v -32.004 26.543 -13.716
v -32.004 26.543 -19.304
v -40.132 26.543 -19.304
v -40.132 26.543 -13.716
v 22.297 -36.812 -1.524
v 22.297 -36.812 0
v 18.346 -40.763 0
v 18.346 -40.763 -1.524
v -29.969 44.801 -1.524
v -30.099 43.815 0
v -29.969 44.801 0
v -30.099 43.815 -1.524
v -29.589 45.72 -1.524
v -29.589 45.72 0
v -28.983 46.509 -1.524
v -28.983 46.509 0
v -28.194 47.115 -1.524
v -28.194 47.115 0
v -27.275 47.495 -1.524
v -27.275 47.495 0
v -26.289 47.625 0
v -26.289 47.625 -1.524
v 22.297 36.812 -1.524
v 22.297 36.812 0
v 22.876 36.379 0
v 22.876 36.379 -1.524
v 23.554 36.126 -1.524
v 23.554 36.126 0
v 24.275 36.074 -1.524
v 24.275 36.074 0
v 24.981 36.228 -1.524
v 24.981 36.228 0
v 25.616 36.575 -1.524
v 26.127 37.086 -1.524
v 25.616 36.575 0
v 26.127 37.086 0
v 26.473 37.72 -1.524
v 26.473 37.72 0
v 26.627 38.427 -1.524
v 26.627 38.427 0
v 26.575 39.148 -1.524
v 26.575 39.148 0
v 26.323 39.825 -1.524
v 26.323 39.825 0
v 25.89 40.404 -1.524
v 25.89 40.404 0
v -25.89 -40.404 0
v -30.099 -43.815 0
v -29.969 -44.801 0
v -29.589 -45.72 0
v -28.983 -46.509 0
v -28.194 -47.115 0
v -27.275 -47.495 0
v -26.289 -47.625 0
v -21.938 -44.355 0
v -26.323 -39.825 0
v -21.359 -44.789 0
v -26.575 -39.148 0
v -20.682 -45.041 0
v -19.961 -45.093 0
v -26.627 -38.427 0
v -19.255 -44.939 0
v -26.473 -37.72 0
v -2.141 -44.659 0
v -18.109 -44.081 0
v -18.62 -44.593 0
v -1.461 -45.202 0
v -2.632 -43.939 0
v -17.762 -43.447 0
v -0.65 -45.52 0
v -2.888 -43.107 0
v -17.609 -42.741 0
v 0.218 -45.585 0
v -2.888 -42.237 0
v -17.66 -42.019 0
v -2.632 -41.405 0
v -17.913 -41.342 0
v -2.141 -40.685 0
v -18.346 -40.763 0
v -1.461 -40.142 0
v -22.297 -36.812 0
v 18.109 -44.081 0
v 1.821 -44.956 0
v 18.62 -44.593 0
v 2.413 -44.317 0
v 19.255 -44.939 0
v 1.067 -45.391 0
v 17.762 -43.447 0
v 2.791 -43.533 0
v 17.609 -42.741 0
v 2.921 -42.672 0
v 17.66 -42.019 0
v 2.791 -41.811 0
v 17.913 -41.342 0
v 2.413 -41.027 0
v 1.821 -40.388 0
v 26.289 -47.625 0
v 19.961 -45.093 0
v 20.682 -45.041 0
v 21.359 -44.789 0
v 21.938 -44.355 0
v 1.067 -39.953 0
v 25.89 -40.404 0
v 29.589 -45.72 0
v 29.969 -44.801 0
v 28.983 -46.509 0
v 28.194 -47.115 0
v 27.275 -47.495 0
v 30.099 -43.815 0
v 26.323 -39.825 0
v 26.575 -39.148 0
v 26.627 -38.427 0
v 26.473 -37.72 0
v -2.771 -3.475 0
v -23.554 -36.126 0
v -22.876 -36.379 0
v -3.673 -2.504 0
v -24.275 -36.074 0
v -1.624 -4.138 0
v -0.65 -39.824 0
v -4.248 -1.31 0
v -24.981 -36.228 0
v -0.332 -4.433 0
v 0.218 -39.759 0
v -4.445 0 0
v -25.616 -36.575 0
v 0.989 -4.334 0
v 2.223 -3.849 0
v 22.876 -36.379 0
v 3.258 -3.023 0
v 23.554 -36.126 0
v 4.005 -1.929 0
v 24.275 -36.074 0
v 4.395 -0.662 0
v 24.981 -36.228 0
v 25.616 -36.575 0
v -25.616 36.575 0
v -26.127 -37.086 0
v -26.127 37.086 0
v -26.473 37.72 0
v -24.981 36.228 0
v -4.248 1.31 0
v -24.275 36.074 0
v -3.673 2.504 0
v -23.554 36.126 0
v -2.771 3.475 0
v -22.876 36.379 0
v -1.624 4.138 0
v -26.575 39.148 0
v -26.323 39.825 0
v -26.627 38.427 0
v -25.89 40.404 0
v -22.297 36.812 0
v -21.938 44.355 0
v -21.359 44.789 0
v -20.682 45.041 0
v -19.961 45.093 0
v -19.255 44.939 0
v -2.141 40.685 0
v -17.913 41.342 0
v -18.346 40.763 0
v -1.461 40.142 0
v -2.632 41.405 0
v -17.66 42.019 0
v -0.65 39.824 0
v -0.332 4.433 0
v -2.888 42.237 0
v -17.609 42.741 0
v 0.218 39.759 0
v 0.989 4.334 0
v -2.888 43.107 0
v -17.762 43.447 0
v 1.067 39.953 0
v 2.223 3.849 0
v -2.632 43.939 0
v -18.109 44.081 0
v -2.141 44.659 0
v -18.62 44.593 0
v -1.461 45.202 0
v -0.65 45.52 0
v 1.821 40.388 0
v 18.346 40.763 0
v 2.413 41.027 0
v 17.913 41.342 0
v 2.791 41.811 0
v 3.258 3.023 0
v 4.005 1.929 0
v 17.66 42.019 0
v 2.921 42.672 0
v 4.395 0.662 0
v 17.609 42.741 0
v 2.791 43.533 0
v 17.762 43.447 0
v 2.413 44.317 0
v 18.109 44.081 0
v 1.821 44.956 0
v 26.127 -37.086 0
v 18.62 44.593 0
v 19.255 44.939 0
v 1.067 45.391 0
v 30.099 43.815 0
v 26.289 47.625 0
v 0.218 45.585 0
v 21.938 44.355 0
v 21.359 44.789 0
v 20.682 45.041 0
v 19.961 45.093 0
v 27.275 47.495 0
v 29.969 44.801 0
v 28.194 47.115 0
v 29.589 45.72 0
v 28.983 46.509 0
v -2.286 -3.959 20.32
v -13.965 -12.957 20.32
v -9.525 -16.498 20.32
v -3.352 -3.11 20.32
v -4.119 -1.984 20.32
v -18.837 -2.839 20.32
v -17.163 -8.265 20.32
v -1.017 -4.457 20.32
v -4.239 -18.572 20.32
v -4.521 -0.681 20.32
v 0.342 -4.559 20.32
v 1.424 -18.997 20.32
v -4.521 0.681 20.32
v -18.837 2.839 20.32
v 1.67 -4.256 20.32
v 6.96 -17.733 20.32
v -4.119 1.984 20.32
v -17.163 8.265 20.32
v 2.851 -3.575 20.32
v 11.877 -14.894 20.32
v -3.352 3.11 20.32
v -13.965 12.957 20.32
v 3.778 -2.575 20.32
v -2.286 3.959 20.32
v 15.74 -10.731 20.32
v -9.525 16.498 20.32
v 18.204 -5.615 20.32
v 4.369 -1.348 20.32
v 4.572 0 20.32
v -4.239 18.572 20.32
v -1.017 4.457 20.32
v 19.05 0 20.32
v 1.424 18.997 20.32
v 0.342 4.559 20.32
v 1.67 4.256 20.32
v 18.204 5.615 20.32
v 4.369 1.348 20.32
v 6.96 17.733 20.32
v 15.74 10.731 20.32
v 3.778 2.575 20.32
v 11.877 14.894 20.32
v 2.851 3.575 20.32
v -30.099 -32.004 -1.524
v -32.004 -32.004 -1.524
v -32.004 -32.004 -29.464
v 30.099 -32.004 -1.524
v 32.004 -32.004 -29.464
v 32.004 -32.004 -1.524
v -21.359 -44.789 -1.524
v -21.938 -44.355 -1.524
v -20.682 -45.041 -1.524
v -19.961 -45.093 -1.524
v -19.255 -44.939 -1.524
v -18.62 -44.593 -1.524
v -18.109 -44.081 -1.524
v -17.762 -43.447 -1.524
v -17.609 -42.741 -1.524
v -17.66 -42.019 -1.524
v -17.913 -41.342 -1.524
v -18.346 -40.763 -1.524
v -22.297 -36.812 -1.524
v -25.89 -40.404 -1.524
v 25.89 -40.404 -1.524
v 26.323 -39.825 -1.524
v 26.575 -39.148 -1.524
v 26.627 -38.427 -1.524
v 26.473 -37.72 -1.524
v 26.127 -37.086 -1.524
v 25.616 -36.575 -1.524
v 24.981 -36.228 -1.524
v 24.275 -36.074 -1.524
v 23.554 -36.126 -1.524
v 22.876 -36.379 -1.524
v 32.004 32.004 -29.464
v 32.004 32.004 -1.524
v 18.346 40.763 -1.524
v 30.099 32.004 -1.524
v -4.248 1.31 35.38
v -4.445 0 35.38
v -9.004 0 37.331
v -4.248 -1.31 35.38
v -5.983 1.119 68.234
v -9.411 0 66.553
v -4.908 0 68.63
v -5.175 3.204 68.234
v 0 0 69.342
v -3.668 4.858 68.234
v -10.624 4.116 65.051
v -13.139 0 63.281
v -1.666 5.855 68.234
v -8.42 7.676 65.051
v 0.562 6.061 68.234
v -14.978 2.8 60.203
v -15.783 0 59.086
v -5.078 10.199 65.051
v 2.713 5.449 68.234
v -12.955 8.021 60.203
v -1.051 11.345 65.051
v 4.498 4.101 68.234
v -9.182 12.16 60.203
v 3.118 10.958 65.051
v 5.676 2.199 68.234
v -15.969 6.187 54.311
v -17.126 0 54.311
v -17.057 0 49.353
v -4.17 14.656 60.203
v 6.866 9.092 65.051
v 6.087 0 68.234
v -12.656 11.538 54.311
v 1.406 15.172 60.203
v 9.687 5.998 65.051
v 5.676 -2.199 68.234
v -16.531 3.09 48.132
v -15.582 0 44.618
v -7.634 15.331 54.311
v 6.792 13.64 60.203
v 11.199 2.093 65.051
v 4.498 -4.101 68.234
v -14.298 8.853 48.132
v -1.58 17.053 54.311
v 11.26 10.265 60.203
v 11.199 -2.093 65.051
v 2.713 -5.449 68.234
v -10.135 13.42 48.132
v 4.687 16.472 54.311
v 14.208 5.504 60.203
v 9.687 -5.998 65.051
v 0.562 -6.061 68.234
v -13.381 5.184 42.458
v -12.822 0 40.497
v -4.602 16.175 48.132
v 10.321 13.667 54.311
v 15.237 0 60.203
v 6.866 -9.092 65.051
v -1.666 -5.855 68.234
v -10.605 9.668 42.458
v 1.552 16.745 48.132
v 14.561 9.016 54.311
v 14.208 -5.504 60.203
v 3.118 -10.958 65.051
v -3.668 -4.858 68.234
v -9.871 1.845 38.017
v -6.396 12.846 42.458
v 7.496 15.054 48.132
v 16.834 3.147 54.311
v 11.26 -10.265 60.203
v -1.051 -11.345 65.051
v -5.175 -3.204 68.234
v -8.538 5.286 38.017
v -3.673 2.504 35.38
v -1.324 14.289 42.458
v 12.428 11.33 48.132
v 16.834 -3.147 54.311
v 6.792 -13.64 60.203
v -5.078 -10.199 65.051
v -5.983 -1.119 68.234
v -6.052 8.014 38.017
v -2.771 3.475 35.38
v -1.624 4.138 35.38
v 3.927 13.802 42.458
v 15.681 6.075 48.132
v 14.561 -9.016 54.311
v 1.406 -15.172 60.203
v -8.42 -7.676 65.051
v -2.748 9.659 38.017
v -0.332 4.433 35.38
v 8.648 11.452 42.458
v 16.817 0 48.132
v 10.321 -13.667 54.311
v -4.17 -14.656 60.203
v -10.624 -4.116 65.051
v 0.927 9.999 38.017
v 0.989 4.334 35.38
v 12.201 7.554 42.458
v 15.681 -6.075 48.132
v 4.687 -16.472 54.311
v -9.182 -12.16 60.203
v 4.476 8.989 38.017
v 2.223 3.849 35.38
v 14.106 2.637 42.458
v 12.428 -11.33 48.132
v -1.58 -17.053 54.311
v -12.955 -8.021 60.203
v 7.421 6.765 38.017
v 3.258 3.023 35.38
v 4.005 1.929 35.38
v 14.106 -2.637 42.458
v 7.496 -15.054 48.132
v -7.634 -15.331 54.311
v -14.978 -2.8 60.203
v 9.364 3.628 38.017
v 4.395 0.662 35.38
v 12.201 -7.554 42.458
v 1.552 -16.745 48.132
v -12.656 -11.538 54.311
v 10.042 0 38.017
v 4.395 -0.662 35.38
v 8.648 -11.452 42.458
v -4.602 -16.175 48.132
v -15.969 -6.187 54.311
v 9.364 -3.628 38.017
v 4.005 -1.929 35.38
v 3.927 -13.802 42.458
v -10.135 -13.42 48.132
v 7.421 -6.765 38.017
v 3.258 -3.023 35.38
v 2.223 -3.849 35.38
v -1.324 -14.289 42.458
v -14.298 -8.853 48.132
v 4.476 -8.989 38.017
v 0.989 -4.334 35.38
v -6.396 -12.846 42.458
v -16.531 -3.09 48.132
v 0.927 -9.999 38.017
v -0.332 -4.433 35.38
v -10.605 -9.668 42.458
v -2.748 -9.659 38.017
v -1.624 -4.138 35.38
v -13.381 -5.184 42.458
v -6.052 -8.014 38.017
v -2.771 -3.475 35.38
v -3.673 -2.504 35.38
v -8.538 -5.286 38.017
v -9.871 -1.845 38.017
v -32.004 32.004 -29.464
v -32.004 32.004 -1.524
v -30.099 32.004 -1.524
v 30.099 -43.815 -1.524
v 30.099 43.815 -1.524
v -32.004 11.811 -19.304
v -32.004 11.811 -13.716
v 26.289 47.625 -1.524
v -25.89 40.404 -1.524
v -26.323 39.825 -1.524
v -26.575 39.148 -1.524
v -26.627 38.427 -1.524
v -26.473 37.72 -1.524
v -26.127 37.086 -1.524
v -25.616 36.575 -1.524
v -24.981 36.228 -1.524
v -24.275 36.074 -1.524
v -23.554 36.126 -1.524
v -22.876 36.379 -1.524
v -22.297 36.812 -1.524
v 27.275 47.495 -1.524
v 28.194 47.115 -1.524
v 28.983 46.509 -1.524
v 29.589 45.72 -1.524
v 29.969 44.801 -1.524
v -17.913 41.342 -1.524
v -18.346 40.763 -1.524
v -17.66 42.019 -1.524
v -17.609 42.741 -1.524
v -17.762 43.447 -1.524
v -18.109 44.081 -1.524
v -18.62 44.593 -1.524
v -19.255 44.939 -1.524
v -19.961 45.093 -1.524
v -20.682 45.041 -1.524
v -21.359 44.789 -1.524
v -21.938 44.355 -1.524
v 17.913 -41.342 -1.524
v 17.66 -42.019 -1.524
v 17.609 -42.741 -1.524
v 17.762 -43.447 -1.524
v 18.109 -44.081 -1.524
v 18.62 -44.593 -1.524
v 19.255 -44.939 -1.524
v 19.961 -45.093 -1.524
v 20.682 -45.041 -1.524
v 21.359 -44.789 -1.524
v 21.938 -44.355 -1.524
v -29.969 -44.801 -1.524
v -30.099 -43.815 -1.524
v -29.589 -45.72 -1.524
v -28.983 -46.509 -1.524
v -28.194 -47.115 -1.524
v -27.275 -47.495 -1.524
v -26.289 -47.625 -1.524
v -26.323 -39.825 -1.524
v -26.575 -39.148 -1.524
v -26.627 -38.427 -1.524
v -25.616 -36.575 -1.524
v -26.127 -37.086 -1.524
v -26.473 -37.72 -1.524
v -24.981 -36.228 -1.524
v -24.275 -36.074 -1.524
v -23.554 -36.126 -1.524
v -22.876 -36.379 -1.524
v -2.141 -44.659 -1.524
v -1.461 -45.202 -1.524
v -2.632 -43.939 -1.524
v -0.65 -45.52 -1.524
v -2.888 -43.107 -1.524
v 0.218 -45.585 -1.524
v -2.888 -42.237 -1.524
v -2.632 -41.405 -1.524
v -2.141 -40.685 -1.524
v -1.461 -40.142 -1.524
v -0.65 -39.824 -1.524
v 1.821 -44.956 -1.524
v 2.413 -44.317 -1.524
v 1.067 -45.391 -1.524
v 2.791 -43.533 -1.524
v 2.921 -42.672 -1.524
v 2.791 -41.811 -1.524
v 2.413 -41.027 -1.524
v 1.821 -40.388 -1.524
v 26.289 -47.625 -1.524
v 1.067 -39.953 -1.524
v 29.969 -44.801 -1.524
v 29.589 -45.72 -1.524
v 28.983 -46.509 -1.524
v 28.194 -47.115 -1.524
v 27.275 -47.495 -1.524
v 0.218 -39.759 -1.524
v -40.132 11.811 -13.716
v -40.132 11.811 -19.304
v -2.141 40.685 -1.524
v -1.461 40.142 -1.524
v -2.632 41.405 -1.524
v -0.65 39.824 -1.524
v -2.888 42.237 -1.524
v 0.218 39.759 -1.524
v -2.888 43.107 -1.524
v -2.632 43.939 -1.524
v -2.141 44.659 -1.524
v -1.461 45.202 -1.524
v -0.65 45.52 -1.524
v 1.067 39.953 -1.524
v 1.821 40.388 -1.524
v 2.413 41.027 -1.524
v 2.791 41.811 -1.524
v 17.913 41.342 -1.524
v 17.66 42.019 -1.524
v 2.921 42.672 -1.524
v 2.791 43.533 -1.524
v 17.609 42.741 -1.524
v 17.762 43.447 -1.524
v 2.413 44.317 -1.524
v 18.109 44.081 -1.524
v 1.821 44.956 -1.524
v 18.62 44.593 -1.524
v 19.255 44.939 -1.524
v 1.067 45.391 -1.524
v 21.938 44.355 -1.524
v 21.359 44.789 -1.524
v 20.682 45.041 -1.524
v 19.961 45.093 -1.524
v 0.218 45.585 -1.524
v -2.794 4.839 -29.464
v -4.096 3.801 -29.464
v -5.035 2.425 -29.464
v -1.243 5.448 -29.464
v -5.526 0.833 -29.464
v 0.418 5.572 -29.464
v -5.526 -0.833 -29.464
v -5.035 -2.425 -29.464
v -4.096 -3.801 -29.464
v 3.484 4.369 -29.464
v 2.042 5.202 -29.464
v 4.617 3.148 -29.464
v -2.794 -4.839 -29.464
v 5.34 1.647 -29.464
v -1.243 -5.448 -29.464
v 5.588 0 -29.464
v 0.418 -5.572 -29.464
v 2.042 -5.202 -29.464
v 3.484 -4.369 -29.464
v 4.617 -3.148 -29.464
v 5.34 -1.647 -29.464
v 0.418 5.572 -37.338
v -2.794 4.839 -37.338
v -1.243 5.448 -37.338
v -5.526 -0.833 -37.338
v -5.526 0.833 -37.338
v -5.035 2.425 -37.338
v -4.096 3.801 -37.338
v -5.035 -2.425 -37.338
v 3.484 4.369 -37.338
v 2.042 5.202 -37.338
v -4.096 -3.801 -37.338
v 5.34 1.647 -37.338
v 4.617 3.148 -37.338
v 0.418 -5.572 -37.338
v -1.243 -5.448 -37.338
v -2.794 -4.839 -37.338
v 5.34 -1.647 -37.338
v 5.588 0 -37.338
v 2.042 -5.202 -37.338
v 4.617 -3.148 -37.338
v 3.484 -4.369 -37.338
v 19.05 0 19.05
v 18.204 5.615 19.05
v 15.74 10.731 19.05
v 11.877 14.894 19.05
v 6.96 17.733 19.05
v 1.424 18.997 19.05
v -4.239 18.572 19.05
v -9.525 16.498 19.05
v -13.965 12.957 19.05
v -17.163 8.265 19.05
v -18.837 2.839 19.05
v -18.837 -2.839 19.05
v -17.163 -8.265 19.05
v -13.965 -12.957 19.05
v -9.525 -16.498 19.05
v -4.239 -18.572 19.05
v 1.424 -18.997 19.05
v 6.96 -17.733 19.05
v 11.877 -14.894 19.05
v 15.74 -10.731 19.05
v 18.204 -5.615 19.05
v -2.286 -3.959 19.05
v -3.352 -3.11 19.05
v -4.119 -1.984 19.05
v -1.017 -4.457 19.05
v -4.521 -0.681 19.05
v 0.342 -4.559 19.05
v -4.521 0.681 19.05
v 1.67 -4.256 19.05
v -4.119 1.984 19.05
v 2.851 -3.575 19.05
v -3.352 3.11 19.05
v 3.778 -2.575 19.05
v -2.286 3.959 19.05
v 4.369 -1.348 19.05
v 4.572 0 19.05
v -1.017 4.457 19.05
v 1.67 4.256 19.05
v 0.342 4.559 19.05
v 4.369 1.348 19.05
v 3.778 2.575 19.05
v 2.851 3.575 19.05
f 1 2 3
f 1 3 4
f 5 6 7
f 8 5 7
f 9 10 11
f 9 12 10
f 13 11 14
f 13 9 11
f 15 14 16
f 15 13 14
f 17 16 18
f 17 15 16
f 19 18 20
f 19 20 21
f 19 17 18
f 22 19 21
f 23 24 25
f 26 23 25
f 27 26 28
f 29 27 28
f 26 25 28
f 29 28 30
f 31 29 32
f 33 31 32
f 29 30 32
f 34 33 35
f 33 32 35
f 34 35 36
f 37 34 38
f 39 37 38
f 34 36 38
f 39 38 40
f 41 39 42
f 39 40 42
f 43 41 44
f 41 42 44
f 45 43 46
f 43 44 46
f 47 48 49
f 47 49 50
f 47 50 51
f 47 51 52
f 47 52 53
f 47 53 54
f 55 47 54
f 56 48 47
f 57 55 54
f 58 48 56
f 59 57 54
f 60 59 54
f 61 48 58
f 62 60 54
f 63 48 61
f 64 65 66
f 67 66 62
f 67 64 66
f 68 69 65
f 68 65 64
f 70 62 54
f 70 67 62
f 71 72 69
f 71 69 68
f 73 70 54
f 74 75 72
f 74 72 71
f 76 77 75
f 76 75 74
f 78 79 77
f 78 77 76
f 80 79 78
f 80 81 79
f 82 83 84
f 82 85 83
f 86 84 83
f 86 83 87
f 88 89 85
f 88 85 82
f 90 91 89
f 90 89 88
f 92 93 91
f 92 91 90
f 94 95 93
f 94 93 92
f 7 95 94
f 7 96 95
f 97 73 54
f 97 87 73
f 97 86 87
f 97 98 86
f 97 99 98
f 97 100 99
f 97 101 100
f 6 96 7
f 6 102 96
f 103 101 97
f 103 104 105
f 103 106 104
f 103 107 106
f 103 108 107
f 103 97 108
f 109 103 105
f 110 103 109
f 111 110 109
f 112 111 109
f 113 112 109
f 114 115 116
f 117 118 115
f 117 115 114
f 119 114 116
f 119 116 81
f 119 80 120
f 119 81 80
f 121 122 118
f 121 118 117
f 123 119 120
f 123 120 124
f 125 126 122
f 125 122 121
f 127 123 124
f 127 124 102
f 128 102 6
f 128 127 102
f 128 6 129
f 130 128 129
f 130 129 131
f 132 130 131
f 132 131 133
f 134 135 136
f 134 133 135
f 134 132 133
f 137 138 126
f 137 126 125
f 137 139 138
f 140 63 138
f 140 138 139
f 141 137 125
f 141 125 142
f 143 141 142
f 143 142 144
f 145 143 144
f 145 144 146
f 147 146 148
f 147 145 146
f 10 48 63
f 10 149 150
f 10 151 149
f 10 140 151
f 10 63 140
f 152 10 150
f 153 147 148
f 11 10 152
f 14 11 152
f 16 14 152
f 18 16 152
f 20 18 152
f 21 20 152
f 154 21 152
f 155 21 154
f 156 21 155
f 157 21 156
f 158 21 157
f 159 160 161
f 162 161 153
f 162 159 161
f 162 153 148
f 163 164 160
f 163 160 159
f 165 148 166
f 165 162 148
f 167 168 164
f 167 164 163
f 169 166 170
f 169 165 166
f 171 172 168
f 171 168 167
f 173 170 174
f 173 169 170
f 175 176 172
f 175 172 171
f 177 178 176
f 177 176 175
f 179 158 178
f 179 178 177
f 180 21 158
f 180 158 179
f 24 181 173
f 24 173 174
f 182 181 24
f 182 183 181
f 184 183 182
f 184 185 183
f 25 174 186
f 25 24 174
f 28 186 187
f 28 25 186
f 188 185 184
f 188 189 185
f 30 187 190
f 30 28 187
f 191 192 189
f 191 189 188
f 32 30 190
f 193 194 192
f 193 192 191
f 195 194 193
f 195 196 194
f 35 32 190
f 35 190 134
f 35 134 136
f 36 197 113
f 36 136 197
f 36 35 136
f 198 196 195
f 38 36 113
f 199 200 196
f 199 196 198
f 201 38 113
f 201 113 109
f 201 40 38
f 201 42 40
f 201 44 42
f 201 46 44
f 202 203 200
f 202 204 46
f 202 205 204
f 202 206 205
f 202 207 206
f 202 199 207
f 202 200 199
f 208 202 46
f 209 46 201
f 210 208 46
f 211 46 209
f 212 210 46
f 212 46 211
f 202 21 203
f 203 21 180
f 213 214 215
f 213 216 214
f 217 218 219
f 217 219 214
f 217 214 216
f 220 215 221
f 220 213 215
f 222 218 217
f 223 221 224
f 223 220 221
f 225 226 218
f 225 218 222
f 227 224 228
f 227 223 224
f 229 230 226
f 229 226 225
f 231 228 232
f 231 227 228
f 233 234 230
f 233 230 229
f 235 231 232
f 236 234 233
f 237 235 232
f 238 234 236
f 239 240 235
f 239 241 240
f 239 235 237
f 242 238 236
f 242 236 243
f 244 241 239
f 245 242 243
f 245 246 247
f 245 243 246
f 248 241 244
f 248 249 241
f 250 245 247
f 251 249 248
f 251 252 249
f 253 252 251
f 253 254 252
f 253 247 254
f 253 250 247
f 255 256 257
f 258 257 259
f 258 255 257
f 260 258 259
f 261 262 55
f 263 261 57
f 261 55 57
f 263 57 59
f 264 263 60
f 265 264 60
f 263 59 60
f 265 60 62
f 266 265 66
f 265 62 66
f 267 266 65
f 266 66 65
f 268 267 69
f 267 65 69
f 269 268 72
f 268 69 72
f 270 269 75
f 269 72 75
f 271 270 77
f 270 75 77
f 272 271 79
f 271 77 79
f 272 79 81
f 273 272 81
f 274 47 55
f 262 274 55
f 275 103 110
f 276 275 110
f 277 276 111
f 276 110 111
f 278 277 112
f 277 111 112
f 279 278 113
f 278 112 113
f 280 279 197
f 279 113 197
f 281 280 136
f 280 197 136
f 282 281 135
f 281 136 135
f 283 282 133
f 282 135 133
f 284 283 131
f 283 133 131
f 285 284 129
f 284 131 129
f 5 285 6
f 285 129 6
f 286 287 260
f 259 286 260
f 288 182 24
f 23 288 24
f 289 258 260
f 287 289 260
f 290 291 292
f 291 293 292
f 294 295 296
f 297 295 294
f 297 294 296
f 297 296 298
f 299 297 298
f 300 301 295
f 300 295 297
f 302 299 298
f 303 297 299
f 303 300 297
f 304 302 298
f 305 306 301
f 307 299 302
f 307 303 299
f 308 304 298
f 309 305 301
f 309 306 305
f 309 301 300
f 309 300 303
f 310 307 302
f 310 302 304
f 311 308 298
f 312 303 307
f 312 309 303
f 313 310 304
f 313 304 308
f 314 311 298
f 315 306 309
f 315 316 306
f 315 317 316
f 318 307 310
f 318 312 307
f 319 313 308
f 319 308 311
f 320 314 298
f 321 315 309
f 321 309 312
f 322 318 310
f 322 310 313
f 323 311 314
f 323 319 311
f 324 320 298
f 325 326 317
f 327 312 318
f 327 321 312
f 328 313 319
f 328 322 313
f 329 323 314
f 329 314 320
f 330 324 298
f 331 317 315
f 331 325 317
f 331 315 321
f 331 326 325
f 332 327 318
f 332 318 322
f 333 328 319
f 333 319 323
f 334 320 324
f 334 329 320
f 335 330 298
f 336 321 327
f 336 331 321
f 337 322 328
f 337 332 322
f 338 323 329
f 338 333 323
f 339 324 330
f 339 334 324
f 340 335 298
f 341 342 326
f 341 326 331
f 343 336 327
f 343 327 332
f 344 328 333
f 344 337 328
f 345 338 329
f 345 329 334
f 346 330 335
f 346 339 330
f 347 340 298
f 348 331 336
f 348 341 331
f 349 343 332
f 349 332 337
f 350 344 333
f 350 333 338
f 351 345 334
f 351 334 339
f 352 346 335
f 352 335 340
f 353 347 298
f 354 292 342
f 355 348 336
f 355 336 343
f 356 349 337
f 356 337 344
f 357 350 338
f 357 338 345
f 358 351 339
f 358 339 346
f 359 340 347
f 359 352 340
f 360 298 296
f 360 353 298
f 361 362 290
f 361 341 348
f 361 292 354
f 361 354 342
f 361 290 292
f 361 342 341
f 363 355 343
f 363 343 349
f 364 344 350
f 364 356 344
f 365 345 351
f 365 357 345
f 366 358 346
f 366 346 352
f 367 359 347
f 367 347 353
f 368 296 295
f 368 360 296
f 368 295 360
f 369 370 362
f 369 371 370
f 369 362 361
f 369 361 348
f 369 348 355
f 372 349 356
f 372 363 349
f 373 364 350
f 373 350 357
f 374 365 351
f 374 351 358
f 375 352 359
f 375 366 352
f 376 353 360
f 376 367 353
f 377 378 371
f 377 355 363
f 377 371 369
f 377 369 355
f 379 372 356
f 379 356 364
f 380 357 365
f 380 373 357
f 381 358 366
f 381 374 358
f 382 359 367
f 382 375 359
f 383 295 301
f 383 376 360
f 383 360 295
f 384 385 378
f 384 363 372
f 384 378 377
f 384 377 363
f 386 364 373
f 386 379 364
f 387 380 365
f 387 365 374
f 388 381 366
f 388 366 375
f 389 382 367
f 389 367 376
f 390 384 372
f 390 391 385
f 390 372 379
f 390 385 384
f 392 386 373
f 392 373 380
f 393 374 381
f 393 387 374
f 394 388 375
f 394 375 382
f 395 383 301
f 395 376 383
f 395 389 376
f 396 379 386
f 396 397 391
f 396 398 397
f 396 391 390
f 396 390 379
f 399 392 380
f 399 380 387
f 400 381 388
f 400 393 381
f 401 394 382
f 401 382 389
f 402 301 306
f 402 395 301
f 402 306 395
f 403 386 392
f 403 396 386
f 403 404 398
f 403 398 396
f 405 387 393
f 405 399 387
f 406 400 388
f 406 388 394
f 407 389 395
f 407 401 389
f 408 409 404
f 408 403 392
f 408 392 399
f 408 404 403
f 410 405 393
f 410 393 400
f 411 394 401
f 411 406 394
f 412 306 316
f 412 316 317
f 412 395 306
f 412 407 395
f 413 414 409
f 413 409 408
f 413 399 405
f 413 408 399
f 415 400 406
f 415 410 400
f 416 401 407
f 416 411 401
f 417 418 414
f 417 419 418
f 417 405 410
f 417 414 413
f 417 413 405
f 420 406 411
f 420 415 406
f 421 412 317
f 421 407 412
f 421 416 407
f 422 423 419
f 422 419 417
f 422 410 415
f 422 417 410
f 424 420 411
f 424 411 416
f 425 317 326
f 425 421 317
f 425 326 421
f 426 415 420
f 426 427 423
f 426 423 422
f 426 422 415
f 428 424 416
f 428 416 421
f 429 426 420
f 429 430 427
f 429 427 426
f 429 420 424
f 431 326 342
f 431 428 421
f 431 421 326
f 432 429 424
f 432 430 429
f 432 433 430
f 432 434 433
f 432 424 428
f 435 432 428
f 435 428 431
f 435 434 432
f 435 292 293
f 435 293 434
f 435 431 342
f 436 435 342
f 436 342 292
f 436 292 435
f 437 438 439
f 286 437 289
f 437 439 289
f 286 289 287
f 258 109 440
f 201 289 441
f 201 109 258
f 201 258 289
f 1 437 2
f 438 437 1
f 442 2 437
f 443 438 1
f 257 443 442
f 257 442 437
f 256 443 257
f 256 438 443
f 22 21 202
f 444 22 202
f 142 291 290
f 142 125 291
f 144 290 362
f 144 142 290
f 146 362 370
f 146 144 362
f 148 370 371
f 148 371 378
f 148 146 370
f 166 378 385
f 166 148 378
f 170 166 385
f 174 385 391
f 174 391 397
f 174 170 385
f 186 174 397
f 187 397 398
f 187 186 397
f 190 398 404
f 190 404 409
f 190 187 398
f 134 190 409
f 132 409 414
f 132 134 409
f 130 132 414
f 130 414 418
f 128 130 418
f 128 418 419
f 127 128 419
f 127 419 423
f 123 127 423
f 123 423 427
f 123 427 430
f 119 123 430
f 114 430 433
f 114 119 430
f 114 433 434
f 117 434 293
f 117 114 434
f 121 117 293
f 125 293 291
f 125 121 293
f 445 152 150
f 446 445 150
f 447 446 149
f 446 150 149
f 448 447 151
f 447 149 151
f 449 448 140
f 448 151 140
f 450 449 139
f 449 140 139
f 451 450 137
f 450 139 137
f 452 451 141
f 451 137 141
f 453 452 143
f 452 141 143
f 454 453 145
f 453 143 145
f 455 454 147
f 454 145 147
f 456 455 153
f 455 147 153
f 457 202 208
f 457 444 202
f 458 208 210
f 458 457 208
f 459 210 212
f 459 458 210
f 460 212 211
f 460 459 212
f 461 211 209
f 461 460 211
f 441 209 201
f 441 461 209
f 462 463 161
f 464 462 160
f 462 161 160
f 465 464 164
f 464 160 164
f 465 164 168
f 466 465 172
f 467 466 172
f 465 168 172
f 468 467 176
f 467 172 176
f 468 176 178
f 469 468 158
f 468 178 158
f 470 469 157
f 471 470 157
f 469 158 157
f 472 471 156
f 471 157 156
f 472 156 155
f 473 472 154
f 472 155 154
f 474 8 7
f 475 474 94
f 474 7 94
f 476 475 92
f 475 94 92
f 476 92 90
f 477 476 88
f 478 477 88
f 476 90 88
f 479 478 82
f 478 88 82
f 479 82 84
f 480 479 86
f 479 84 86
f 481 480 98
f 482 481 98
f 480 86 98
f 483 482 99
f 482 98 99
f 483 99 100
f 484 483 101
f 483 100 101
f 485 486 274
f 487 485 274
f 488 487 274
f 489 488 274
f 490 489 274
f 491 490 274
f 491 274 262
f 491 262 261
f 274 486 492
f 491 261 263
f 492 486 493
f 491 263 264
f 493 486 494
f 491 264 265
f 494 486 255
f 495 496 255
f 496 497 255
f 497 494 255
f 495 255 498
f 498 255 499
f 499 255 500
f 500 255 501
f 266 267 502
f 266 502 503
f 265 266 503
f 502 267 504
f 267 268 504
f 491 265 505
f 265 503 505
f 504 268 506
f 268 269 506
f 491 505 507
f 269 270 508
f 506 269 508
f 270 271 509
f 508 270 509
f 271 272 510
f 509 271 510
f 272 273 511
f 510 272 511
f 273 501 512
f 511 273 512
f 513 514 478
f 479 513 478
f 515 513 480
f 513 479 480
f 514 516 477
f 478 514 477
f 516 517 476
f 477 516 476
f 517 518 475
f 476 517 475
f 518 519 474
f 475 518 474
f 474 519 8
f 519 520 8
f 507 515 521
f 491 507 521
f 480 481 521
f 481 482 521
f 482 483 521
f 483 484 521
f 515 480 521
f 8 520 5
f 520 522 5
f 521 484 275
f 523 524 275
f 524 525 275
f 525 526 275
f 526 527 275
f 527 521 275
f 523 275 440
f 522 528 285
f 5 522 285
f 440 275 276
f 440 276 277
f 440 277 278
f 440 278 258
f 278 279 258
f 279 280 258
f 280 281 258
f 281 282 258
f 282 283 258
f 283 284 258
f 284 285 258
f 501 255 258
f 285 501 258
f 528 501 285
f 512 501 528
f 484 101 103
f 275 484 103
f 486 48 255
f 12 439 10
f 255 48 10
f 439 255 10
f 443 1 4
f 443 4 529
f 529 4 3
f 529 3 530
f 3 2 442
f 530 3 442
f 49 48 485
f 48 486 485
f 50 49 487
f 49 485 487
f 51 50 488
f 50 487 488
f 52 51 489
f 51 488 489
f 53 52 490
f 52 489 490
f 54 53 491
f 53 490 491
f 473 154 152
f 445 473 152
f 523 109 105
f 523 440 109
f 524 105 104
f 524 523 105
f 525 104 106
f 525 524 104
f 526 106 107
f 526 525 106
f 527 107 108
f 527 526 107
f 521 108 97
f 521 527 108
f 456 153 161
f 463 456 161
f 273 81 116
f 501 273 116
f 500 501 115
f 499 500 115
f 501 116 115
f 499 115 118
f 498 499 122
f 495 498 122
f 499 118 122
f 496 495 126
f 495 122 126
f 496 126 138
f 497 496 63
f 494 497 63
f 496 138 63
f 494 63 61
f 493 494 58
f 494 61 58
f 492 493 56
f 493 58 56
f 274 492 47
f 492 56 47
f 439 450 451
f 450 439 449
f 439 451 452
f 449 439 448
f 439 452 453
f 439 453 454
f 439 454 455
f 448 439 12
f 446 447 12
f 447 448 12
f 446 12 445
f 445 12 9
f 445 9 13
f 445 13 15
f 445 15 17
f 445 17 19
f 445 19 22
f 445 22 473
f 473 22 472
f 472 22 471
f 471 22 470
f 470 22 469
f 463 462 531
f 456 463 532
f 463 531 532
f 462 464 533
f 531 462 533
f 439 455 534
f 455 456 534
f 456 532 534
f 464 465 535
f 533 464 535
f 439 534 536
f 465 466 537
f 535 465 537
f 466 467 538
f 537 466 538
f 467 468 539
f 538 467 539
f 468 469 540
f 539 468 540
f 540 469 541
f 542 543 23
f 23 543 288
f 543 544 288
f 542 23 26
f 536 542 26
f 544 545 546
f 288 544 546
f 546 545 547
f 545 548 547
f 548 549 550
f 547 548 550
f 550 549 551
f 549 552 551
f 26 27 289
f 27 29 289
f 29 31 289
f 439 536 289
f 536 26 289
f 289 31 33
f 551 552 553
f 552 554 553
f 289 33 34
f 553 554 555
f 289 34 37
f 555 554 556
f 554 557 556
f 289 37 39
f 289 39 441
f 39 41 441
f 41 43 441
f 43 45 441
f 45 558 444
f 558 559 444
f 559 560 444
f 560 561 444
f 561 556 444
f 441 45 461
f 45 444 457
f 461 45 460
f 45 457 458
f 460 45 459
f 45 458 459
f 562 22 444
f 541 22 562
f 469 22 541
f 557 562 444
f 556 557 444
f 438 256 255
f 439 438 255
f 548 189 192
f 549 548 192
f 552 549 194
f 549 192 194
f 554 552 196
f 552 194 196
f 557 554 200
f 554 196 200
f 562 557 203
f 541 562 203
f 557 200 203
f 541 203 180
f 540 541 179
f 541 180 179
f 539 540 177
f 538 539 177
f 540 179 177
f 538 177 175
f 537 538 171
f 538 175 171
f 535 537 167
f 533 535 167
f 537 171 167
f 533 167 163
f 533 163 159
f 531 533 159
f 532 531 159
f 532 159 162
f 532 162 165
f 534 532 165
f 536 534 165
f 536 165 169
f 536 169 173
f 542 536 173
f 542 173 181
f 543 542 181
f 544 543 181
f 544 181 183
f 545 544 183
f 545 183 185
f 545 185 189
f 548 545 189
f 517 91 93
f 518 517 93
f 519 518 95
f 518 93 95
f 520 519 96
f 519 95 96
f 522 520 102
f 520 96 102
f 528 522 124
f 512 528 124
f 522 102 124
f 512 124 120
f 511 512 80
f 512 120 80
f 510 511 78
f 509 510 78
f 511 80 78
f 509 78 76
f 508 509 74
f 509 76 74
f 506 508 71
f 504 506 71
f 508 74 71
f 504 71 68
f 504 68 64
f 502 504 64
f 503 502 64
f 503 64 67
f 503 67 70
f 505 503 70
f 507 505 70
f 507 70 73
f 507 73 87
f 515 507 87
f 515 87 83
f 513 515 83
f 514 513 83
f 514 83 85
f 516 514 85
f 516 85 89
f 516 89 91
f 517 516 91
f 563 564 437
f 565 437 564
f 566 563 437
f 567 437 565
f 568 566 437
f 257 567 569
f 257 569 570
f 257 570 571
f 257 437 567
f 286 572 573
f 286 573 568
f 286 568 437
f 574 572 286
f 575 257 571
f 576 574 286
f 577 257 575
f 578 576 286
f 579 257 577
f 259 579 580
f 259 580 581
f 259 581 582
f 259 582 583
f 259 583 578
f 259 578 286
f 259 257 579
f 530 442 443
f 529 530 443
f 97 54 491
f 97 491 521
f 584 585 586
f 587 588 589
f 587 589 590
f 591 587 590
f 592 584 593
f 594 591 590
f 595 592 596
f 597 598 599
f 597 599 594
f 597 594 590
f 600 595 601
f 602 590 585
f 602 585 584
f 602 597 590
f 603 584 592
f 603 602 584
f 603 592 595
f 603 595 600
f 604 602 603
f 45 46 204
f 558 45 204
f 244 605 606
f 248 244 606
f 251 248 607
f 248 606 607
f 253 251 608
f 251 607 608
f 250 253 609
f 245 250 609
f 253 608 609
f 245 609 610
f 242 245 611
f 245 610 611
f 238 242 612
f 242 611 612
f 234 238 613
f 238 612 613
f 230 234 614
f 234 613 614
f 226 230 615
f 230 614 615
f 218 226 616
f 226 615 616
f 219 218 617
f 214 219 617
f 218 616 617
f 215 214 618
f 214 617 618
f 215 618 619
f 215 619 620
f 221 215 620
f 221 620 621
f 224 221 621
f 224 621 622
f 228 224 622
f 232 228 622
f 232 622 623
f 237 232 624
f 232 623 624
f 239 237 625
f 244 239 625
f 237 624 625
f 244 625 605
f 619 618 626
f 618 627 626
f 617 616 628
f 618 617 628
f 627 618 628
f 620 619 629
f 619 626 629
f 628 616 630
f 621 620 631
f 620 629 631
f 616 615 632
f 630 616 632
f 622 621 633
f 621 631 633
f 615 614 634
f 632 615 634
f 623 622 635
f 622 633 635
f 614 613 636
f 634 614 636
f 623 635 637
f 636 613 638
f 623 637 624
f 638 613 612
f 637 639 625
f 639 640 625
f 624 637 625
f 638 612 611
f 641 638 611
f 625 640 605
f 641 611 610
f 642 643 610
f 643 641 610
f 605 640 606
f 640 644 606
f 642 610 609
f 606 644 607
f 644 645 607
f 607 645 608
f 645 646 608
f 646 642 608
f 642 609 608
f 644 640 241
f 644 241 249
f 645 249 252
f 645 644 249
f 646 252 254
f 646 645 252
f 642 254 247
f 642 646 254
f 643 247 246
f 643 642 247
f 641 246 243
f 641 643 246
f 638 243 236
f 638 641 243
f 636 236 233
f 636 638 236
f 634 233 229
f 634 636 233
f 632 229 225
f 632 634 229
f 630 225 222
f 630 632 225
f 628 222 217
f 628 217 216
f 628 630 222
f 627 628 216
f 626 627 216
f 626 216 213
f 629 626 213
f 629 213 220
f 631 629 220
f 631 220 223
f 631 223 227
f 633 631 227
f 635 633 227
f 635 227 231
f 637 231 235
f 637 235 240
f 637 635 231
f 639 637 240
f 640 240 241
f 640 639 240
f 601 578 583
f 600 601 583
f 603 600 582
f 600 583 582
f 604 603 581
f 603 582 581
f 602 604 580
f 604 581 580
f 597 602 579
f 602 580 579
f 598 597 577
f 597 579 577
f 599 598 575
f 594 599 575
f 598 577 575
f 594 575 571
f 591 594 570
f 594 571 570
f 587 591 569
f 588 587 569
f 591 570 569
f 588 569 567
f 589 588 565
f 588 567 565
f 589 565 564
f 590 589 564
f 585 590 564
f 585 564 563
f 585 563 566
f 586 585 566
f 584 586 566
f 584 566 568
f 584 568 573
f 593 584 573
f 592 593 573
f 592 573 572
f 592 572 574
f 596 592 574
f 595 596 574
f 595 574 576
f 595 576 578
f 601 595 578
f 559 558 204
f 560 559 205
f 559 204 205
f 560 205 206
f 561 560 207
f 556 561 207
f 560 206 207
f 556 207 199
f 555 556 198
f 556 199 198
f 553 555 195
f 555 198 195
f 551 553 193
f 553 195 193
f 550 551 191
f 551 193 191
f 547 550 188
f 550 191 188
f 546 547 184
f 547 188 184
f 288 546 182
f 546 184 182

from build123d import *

# Parameters (mm, degrees)
F0_W      = 60.198
F0_H      = 95.25
F1_DEPTH  = 1.524
F2_W      = 64.008
F2_H      = 64.008
F3_DEPTH  = 27.94
F4_R      = 5.588
F5_DEPTH  = 35.814
F8_R      = 2.921
F9_DEPTH  = 37.339
F10_R     = 3.81
F12_R     = 19.05
F12_R_2   = 4.572
F13_DEPTH = 1.27
F14_W     = 14.732
F14_H     = 5.588
F15_DEPTH = 8.128


with BuildPart() as f1:
    # F0 (on Top) → F1 (new body)
    with BuildSketch(Plane.XY):
        Rectangle(F0_W, F0_H)
    extrude(amount=-F1_DEPTH)

    # F2 (on face) → F3 (join)
    with BuildSketch(Plane(origin=(0, 0, -1.524), x_dir=(1, 0, 0), z_dir=(0, 0, -1))):
        Rectangle(F2_W, F2_H)
    extrude(amount=F3_DEPTH)

    # F4 (on face) → F5 (join)
    with BuildSketch(Plane(origin=(0, 0, -1.524), x_dir=(1, 0, 0), z_dir=(0, 0, -1))):
        Circle(F4_R)
    extrude(amount=F5_DEPTH)

    # F6 (on Front) → F7 (revolve)
    with BuildSketch(Plane.XZ):
        with BuildLine():
            Line((0, 0), (0, 69.342))
            ThreePointArc((0, 69.342), (-17.125941, 54.311455), (-4.445, 35.379765))
            Line((-4.445, 35.379765), (-4.445, 0))
            Line((-4.445, 0), (0, 0))
        make_face()
    revolve(axis=Axis((0, 0, 34.671), (0, 0, -1)))

    # F8 (on face) → F9 (cut, through all)
    with BuildSketch(Plane.XY):
        with BuildLine():
            ThreePointArc((25.889564, -40.404051), (25.889564, -36.811949), (22.297461, -36.811949))
            Line((22.297461, -36.811949), (18.346149, -40.763261))
            ThreePointArc((18.346149, -40.763261), (18.346149, -44.355364), (21.938251, -44.355364))
            Line((21.938251, -44.355364), (25.889564, -40.404051))
        make_face()
        with BuildLine():
            Line((-18.346149, -40.763261), (-22.297461, -36.811949))
            ThreePointArc((-22.297461, -36.811949), (-25.889564, -36.811949), (-25.889564, -40.404051))
            Line((-25.889564, -40.404051), (-21.938251, -44.355364))
            ThreePointArc((-21.938251, -44.355364), (-18.346149, -44.355364), (-18.346149, -40.763261))
        make_face()
        with BuildLine():
            ThreePointArc((-18.346149, 40.763261), (-18.346149, 44.355364), (-21.938251, 44.355364))
            Line((-21.938251, 44.355364), (-25.889564, 40.404051))
            ThreePointArc((-25.889564, 40.404051), (-25.889564, 36.811949), (-22.297461, 36.811949))
            Line((-22.297461, 36.811949), (-18.346149, 40.763261))
        make_face()
        with BuildLine():
            Line((25.889564, 40.404051), (21.938251, 44.355364))
            ThreePointArc((21.938251, 44.355364), (18.346149, 44.355364), (18.346149, 40.763261))
            Line((18.346149, 40.763261), (22.297461, 36.811949))
            ThreePointArc((22.297461, 36.811949), (25.889564, 36.811949), (25.889564, 40.404051))
        make_face()
        with Locations((0, -42.672)):
            Circle(F8_R)
        with Locations((0, 42.672)):
            Circle(F8_R)
    extrude(amount=-F9_DEPTH, mode=Mode.SUBTRACT)

    # F10
    f10_edges = [f1.edges().sort_by_distance(p)[0] for p in [
        (30.099, -47.625, -0.762),
        (-30.099, -47.625, -0.762),
        (-30.099, 47.625, -0.762),
        (30.099, 47.625, -0.762),
    ]]
    fillet(f10_edges, radius=F10_R)

    # F14 (on face) → F15 (join)
    with BuildSketch(Plane(origin=(-32.004, 0, 0), x_dir=(0, -1, 0), z_dir=(-1, 0, 0))):
        with Locations((-19.177, -16.51)):
            Rectangle(F14_W, F14_H)
    extrude(amount=F15_DEPTH)


with BuildPart() as f13:
    # F12 (on offset) → F13 (new body)
    with BuildSketch(Plane.XY.offset(19.05)):
        Circle(F12_R)
        Circle(F12_R_2, mode=Mode.SUBTRACT)
    extrude(amount=F13_DEPTH)


solid = Compound([f1.part, f13.part])
